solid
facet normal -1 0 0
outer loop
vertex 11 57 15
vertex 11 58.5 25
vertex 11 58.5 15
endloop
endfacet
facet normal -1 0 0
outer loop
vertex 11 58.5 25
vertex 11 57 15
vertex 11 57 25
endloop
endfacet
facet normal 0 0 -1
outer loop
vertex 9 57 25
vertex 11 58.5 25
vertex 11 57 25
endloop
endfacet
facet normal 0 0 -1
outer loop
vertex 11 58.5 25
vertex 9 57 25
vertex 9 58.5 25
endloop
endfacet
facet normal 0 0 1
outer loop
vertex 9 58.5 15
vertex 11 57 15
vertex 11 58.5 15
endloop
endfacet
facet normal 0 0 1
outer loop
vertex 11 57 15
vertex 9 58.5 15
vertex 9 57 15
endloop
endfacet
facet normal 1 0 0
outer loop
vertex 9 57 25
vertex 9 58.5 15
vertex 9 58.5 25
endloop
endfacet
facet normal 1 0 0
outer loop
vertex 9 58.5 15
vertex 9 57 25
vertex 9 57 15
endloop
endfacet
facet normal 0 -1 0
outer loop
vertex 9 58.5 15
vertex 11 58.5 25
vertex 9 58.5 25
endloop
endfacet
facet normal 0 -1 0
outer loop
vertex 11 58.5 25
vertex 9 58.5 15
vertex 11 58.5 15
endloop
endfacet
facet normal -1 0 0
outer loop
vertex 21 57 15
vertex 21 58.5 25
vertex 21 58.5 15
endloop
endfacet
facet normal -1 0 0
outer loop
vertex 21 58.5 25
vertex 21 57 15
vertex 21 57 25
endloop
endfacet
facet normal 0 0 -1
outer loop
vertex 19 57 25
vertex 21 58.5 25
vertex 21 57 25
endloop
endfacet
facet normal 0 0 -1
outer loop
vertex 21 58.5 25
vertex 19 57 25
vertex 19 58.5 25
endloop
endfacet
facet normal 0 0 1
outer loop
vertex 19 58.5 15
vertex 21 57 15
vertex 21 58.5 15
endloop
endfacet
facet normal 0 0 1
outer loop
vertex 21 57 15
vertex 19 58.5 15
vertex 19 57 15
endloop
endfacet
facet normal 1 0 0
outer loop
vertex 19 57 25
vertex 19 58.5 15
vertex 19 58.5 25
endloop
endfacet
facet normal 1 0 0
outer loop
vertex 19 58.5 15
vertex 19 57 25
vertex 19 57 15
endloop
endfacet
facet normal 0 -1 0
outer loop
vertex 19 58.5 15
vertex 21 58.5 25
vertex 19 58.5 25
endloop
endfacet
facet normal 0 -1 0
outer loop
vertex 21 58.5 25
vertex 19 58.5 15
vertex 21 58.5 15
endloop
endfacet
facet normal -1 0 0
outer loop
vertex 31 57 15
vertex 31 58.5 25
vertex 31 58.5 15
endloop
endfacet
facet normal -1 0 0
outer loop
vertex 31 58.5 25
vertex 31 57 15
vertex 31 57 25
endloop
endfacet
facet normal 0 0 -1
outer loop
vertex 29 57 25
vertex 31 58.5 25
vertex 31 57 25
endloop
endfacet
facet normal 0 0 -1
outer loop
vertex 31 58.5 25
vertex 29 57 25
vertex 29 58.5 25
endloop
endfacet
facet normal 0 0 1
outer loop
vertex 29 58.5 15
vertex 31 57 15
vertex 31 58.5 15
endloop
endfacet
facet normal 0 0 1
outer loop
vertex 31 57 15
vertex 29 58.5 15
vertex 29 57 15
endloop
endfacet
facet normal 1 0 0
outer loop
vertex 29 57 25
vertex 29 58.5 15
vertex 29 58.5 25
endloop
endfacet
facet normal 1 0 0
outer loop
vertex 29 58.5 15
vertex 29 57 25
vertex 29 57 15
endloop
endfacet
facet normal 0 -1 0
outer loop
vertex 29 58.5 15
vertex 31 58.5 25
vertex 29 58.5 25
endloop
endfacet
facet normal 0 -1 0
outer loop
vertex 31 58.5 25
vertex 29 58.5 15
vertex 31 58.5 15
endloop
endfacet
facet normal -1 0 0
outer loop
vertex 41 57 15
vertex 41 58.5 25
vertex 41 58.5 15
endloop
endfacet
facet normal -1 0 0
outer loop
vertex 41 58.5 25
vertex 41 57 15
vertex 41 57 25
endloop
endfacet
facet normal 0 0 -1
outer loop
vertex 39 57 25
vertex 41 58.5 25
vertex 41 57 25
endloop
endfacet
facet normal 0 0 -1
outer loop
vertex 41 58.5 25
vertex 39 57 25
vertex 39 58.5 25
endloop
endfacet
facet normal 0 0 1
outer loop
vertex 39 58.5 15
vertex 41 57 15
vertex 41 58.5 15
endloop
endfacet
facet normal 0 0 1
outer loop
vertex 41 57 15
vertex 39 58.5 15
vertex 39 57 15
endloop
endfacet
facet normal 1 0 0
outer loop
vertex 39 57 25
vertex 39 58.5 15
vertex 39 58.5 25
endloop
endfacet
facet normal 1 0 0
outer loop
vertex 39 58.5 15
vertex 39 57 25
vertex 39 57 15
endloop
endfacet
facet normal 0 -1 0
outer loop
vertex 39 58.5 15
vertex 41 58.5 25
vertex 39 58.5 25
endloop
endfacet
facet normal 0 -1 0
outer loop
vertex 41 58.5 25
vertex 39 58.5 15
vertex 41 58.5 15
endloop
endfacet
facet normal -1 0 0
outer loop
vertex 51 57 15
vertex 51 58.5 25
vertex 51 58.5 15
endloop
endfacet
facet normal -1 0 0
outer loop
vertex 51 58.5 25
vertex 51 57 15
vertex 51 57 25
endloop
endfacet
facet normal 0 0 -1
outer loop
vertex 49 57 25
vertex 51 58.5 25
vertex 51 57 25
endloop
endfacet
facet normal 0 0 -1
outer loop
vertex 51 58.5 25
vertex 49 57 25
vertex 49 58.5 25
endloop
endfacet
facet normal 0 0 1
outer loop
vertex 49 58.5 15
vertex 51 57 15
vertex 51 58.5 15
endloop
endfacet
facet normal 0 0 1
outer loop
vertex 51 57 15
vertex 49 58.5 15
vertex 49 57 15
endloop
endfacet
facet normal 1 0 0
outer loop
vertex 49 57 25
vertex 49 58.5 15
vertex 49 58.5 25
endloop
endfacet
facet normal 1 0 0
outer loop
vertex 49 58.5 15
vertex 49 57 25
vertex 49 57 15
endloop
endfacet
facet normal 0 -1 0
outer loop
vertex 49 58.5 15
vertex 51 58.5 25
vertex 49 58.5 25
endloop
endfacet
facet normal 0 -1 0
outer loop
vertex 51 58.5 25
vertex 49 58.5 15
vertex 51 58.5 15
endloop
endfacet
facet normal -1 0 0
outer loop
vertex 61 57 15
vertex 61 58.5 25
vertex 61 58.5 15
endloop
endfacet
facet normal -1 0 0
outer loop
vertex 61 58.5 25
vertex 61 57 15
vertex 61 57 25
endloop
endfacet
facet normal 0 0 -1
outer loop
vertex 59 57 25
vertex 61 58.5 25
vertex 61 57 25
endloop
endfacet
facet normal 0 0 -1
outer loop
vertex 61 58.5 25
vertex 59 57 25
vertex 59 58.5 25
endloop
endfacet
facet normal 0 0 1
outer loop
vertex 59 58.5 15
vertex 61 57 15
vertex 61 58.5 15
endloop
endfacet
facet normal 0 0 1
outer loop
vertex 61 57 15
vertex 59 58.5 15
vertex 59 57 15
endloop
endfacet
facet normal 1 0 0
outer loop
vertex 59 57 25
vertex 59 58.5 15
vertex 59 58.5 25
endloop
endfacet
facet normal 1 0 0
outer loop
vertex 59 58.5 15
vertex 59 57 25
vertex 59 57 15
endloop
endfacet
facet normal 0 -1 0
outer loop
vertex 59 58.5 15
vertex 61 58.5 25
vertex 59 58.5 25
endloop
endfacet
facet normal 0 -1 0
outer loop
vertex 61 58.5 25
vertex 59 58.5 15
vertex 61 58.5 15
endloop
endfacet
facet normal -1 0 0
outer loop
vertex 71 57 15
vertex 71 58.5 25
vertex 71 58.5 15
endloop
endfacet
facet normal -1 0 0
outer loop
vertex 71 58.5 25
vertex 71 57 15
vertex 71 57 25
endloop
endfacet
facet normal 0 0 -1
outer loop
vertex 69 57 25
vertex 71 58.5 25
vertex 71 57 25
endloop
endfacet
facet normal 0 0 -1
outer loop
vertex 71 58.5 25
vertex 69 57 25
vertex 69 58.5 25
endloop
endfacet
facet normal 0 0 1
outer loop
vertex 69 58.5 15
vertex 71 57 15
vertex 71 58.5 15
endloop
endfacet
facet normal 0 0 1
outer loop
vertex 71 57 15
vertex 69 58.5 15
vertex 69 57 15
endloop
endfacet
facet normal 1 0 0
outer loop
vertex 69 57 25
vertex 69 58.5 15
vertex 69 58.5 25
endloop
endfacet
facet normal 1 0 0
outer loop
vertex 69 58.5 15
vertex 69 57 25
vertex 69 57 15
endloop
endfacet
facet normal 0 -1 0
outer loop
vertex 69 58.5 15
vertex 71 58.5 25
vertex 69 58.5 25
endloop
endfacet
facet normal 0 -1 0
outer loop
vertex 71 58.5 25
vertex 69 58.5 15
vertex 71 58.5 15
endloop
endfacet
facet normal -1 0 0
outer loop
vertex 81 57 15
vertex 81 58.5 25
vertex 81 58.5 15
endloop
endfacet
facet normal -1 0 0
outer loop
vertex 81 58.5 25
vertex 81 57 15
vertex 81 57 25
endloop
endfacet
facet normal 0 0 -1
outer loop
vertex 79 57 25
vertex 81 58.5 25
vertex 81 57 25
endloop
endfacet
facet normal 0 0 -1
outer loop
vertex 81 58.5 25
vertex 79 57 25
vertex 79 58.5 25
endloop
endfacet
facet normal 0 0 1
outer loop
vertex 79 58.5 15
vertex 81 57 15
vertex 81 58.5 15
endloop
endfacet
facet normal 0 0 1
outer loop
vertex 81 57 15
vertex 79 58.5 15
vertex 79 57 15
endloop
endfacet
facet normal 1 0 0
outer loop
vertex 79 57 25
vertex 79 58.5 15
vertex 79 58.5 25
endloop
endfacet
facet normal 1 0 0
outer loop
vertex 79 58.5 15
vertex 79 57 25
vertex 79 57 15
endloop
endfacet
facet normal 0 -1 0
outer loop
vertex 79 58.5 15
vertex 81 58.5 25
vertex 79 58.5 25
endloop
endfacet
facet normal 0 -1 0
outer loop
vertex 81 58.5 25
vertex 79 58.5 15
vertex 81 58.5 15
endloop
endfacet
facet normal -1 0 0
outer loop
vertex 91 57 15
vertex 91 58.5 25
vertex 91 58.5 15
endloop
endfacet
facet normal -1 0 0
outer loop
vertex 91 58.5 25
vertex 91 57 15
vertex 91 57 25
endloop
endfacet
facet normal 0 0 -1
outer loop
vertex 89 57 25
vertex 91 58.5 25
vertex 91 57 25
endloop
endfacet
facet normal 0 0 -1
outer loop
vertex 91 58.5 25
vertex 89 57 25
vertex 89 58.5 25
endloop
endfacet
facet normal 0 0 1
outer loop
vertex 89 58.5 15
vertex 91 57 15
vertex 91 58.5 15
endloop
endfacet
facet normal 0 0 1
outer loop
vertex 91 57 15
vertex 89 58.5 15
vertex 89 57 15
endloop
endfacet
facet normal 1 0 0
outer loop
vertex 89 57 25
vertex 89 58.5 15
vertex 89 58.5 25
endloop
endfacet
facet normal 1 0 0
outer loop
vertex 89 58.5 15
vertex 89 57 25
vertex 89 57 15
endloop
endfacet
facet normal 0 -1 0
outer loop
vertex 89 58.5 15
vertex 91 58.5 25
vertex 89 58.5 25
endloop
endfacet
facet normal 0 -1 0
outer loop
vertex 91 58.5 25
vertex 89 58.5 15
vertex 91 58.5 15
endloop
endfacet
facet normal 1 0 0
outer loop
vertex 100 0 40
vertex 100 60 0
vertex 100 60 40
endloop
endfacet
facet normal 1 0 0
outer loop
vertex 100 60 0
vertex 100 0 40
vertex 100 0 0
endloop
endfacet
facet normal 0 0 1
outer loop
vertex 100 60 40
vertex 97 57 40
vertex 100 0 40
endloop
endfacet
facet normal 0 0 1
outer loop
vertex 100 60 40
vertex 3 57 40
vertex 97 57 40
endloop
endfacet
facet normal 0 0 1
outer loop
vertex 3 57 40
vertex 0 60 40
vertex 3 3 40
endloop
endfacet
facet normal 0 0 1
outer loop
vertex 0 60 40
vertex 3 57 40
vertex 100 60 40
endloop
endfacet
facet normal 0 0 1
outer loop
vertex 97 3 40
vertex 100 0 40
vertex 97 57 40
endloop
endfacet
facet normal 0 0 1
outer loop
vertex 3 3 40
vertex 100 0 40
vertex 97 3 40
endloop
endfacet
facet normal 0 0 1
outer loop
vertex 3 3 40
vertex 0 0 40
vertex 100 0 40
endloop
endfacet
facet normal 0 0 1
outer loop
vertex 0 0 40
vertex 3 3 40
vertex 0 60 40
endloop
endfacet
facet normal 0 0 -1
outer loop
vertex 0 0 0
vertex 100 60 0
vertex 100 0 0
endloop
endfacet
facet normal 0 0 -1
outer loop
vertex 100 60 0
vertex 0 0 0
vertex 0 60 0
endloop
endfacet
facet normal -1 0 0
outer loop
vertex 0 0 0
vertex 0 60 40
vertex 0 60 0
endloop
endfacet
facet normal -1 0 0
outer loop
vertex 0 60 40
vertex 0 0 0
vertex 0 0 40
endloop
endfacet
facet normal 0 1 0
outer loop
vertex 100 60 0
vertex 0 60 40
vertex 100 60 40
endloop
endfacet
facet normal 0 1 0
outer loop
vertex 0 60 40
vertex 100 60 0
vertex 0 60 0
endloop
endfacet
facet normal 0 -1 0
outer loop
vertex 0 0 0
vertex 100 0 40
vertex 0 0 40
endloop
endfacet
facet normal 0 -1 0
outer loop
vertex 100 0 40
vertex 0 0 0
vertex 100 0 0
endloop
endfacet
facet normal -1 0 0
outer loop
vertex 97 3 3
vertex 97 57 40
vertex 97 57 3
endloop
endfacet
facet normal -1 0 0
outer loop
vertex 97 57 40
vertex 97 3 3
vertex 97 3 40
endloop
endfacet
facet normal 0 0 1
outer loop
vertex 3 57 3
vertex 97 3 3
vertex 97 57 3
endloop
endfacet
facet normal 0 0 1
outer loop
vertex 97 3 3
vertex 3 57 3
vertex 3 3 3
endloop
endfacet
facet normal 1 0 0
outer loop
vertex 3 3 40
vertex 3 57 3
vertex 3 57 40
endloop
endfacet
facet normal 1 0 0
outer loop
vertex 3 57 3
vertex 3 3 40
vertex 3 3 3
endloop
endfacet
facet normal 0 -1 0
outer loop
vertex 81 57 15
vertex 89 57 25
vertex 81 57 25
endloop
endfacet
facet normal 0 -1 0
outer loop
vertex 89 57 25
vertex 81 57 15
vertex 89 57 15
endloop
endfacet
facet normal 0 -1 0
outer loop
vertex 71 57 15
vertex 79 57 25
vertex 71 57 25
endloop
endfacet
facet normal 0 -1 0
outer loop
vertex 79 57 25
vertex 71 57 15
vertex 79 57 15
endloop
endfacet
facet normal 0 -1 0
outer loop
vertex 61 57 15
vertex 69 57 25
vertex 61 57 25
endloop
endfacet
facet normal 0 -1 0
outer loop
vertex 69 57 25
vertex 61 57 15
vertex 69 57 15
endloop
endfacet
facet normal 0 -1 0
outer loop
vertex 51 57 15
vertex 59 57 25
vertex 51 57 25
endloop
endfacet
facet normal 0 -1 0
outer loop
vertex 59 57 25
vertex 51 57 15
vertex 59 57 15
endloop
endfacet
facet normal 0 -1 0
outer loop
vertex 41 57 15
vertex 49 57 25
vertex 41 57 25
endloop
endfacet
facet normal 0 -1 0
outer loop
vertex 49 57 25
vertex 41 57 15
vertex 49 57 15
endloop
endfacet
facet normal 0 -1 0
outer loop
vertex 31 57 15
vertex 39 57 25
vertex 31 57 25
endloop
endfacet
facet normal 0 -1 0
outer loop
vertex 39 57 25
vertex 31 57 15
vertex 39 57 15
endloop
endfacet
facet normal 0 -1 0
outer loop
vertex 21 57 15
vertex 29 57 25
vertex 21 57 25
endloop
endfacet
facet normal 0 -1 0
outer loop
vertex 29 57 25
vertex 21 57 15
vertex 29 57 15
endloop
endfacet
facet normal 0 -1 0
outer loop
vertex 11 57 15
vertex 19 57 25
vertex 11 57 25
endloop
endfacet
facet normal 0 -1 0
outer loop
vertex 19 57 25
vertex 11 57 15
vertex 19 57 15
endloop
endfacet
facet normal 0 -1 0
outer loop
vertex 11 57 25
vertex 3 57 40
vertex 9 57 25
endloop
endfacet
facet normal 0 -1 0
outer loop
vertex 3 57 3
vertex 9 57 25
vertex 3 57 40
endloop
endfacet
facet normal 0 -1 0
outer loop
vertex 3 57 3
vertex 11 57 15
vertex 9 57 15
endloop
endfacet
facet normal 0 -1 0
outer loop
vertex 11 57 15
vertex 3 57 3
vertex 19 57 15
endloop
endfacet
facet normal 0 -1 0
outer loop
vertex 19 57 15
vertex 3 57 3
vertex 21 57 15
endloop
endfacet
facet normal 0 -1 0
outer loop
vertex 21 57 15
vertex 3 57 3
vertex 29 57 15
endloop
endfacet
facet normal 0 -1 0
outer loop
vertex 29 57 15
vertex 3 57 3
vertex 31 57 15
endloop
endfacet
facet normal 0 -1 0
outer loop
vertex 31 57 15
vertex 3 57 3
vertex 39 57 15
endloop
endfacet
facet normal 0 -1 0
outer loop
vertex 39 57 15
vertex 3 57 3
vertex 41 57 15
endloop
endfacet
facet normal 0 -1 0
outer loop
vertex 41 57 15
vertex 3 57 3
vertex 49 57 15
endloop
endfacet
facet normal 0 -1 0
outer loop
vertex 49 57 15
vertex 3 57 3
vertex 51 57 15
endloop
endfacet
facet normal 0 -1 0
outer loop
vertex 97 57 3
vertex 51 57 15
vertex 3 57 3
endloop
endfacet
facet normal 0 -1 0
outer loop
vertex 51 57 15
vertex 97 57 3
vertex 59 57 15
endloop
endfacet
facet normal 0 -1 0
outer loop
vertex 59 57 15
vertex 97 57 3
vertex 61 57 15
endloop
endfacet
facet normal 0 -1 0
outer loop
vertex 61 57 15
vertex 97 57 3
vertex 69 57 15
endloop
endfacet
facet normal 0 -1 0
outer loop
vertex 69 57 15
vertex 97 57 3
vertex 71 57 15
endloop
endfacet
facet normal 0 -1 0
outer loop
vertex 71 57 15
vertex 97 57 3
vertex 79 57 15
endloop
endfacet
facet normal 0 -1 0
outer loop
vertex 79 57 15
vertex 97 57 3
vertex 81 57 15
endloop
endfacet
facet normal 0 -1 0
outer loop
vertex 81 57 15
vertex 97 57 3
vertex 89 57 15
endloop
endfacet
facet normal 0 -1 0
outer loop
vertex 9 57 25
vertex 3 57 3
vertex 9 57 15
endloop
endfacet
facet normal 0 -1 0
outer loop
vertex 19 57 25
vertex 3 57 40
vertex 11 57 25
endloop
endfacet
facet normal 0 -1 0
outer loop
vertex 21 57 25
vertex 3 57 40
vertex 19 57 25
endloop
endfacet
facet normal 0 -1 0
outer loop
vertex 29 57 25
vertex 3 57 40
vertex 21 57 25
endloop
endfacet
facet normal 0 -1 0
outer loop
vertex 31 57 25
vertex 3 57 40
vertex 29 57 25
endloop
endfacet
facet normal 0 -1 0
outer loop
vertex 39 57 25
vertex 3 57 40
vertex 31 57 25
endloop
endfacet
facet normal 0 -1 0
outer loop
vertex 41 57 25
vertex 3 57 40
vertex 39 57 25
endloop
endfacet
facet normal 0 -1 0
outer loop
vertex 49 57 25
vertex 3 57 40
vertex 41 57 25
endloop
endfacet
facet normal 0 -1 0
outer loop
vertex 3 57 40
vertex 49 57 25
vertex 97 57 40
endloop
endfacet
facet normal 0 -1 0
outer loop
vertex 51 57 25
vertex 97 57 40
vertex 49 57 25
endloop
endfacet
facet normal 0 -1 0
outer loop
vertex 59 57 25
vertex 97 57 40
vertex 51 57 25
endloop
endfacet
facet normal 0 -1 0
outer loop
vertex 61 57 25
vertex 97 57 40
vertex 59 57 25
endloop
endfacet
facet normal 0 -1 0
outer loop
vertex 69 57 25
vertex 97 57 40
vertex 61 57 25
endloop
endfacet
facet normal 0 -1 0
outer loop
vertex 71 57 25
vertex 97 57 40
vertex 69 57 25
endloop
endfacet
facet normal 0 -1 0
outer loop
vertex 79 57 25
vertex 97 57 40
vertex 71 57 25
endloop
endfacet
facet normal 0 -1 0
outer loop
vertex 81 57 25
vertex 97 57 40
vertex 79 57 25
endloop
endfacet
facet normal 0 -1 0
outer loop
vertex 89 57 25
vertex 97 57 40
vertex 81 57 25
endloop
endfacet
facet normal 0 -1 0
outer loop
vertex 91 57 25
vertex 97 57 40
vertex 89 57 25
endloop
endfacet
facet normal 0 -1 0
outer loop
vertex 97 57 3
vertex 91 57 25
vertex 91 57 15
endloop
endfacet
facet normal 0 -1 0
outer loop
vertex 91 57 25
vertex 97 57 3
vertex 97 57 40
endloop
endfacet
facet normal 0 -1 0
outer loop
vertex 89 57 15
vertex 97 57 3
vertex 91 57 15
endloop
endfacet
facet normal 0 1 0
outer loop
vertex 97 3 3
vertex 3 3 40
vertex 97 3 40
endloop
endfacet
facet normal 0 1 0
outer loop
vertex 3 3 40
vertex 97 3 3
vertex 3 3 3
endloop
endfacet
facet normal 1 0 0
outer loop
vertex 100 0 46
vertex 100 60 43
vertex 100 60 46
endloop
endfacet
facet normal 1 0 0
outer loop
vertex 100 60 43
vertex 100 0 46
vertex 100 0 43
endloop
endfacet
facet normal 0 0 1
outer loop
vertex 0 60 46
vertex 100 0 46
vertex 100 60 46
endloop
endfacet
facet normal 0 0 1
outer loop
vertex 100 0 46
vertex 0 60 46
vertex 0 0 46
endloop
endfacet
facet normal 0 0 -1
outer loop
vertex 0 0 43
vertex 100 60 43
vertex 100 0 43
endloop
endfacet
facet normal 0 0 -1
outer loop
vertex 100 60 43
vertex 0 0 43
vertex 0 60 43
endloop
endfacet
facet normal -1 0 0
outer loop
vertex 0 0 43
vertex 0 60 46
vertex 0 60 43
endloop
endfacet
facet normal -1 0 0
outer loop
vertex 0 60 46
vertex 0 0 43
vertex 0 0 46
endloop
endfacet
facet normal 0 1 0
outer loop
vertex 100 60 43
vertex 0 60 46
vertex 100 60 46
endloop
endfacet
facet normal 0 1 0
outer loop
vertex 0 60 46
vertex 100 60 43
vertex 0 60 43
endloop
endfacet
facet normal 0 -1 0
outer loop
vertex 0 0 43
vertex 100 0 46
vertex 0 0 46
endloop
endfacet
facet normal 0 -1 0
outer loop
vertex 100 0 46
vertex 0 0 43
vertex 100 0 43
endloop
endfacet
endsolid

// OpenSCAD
// Parámetros
ancho = 100;
profundidad = 60;
altura = 40;
espesor = 3;

// Caja principal
module caja() {
    difference() {
        cube([ancho, profundidad, altura]); // Caja exterior
        translate([espesor, espesor, espesor]) 
            cube([ancho - 2*espesor, profundidad - 2*espesor, altura]); // Hueco interior
        
        // Ranuras de ventilación
        for (i = [10:10:ancho-10]) {
            translate([i, profundidad-espesor-1, altura/2])
                cube([2, espesor+2, 10], center=true);
        }
    }
}

// Tapa deslizable
module tapa() {
    translate([0, 0, altura + espesor])
        cube([ancho, profundidad, espesor]);
}

// Ensamblaje
caja();
tapa();
